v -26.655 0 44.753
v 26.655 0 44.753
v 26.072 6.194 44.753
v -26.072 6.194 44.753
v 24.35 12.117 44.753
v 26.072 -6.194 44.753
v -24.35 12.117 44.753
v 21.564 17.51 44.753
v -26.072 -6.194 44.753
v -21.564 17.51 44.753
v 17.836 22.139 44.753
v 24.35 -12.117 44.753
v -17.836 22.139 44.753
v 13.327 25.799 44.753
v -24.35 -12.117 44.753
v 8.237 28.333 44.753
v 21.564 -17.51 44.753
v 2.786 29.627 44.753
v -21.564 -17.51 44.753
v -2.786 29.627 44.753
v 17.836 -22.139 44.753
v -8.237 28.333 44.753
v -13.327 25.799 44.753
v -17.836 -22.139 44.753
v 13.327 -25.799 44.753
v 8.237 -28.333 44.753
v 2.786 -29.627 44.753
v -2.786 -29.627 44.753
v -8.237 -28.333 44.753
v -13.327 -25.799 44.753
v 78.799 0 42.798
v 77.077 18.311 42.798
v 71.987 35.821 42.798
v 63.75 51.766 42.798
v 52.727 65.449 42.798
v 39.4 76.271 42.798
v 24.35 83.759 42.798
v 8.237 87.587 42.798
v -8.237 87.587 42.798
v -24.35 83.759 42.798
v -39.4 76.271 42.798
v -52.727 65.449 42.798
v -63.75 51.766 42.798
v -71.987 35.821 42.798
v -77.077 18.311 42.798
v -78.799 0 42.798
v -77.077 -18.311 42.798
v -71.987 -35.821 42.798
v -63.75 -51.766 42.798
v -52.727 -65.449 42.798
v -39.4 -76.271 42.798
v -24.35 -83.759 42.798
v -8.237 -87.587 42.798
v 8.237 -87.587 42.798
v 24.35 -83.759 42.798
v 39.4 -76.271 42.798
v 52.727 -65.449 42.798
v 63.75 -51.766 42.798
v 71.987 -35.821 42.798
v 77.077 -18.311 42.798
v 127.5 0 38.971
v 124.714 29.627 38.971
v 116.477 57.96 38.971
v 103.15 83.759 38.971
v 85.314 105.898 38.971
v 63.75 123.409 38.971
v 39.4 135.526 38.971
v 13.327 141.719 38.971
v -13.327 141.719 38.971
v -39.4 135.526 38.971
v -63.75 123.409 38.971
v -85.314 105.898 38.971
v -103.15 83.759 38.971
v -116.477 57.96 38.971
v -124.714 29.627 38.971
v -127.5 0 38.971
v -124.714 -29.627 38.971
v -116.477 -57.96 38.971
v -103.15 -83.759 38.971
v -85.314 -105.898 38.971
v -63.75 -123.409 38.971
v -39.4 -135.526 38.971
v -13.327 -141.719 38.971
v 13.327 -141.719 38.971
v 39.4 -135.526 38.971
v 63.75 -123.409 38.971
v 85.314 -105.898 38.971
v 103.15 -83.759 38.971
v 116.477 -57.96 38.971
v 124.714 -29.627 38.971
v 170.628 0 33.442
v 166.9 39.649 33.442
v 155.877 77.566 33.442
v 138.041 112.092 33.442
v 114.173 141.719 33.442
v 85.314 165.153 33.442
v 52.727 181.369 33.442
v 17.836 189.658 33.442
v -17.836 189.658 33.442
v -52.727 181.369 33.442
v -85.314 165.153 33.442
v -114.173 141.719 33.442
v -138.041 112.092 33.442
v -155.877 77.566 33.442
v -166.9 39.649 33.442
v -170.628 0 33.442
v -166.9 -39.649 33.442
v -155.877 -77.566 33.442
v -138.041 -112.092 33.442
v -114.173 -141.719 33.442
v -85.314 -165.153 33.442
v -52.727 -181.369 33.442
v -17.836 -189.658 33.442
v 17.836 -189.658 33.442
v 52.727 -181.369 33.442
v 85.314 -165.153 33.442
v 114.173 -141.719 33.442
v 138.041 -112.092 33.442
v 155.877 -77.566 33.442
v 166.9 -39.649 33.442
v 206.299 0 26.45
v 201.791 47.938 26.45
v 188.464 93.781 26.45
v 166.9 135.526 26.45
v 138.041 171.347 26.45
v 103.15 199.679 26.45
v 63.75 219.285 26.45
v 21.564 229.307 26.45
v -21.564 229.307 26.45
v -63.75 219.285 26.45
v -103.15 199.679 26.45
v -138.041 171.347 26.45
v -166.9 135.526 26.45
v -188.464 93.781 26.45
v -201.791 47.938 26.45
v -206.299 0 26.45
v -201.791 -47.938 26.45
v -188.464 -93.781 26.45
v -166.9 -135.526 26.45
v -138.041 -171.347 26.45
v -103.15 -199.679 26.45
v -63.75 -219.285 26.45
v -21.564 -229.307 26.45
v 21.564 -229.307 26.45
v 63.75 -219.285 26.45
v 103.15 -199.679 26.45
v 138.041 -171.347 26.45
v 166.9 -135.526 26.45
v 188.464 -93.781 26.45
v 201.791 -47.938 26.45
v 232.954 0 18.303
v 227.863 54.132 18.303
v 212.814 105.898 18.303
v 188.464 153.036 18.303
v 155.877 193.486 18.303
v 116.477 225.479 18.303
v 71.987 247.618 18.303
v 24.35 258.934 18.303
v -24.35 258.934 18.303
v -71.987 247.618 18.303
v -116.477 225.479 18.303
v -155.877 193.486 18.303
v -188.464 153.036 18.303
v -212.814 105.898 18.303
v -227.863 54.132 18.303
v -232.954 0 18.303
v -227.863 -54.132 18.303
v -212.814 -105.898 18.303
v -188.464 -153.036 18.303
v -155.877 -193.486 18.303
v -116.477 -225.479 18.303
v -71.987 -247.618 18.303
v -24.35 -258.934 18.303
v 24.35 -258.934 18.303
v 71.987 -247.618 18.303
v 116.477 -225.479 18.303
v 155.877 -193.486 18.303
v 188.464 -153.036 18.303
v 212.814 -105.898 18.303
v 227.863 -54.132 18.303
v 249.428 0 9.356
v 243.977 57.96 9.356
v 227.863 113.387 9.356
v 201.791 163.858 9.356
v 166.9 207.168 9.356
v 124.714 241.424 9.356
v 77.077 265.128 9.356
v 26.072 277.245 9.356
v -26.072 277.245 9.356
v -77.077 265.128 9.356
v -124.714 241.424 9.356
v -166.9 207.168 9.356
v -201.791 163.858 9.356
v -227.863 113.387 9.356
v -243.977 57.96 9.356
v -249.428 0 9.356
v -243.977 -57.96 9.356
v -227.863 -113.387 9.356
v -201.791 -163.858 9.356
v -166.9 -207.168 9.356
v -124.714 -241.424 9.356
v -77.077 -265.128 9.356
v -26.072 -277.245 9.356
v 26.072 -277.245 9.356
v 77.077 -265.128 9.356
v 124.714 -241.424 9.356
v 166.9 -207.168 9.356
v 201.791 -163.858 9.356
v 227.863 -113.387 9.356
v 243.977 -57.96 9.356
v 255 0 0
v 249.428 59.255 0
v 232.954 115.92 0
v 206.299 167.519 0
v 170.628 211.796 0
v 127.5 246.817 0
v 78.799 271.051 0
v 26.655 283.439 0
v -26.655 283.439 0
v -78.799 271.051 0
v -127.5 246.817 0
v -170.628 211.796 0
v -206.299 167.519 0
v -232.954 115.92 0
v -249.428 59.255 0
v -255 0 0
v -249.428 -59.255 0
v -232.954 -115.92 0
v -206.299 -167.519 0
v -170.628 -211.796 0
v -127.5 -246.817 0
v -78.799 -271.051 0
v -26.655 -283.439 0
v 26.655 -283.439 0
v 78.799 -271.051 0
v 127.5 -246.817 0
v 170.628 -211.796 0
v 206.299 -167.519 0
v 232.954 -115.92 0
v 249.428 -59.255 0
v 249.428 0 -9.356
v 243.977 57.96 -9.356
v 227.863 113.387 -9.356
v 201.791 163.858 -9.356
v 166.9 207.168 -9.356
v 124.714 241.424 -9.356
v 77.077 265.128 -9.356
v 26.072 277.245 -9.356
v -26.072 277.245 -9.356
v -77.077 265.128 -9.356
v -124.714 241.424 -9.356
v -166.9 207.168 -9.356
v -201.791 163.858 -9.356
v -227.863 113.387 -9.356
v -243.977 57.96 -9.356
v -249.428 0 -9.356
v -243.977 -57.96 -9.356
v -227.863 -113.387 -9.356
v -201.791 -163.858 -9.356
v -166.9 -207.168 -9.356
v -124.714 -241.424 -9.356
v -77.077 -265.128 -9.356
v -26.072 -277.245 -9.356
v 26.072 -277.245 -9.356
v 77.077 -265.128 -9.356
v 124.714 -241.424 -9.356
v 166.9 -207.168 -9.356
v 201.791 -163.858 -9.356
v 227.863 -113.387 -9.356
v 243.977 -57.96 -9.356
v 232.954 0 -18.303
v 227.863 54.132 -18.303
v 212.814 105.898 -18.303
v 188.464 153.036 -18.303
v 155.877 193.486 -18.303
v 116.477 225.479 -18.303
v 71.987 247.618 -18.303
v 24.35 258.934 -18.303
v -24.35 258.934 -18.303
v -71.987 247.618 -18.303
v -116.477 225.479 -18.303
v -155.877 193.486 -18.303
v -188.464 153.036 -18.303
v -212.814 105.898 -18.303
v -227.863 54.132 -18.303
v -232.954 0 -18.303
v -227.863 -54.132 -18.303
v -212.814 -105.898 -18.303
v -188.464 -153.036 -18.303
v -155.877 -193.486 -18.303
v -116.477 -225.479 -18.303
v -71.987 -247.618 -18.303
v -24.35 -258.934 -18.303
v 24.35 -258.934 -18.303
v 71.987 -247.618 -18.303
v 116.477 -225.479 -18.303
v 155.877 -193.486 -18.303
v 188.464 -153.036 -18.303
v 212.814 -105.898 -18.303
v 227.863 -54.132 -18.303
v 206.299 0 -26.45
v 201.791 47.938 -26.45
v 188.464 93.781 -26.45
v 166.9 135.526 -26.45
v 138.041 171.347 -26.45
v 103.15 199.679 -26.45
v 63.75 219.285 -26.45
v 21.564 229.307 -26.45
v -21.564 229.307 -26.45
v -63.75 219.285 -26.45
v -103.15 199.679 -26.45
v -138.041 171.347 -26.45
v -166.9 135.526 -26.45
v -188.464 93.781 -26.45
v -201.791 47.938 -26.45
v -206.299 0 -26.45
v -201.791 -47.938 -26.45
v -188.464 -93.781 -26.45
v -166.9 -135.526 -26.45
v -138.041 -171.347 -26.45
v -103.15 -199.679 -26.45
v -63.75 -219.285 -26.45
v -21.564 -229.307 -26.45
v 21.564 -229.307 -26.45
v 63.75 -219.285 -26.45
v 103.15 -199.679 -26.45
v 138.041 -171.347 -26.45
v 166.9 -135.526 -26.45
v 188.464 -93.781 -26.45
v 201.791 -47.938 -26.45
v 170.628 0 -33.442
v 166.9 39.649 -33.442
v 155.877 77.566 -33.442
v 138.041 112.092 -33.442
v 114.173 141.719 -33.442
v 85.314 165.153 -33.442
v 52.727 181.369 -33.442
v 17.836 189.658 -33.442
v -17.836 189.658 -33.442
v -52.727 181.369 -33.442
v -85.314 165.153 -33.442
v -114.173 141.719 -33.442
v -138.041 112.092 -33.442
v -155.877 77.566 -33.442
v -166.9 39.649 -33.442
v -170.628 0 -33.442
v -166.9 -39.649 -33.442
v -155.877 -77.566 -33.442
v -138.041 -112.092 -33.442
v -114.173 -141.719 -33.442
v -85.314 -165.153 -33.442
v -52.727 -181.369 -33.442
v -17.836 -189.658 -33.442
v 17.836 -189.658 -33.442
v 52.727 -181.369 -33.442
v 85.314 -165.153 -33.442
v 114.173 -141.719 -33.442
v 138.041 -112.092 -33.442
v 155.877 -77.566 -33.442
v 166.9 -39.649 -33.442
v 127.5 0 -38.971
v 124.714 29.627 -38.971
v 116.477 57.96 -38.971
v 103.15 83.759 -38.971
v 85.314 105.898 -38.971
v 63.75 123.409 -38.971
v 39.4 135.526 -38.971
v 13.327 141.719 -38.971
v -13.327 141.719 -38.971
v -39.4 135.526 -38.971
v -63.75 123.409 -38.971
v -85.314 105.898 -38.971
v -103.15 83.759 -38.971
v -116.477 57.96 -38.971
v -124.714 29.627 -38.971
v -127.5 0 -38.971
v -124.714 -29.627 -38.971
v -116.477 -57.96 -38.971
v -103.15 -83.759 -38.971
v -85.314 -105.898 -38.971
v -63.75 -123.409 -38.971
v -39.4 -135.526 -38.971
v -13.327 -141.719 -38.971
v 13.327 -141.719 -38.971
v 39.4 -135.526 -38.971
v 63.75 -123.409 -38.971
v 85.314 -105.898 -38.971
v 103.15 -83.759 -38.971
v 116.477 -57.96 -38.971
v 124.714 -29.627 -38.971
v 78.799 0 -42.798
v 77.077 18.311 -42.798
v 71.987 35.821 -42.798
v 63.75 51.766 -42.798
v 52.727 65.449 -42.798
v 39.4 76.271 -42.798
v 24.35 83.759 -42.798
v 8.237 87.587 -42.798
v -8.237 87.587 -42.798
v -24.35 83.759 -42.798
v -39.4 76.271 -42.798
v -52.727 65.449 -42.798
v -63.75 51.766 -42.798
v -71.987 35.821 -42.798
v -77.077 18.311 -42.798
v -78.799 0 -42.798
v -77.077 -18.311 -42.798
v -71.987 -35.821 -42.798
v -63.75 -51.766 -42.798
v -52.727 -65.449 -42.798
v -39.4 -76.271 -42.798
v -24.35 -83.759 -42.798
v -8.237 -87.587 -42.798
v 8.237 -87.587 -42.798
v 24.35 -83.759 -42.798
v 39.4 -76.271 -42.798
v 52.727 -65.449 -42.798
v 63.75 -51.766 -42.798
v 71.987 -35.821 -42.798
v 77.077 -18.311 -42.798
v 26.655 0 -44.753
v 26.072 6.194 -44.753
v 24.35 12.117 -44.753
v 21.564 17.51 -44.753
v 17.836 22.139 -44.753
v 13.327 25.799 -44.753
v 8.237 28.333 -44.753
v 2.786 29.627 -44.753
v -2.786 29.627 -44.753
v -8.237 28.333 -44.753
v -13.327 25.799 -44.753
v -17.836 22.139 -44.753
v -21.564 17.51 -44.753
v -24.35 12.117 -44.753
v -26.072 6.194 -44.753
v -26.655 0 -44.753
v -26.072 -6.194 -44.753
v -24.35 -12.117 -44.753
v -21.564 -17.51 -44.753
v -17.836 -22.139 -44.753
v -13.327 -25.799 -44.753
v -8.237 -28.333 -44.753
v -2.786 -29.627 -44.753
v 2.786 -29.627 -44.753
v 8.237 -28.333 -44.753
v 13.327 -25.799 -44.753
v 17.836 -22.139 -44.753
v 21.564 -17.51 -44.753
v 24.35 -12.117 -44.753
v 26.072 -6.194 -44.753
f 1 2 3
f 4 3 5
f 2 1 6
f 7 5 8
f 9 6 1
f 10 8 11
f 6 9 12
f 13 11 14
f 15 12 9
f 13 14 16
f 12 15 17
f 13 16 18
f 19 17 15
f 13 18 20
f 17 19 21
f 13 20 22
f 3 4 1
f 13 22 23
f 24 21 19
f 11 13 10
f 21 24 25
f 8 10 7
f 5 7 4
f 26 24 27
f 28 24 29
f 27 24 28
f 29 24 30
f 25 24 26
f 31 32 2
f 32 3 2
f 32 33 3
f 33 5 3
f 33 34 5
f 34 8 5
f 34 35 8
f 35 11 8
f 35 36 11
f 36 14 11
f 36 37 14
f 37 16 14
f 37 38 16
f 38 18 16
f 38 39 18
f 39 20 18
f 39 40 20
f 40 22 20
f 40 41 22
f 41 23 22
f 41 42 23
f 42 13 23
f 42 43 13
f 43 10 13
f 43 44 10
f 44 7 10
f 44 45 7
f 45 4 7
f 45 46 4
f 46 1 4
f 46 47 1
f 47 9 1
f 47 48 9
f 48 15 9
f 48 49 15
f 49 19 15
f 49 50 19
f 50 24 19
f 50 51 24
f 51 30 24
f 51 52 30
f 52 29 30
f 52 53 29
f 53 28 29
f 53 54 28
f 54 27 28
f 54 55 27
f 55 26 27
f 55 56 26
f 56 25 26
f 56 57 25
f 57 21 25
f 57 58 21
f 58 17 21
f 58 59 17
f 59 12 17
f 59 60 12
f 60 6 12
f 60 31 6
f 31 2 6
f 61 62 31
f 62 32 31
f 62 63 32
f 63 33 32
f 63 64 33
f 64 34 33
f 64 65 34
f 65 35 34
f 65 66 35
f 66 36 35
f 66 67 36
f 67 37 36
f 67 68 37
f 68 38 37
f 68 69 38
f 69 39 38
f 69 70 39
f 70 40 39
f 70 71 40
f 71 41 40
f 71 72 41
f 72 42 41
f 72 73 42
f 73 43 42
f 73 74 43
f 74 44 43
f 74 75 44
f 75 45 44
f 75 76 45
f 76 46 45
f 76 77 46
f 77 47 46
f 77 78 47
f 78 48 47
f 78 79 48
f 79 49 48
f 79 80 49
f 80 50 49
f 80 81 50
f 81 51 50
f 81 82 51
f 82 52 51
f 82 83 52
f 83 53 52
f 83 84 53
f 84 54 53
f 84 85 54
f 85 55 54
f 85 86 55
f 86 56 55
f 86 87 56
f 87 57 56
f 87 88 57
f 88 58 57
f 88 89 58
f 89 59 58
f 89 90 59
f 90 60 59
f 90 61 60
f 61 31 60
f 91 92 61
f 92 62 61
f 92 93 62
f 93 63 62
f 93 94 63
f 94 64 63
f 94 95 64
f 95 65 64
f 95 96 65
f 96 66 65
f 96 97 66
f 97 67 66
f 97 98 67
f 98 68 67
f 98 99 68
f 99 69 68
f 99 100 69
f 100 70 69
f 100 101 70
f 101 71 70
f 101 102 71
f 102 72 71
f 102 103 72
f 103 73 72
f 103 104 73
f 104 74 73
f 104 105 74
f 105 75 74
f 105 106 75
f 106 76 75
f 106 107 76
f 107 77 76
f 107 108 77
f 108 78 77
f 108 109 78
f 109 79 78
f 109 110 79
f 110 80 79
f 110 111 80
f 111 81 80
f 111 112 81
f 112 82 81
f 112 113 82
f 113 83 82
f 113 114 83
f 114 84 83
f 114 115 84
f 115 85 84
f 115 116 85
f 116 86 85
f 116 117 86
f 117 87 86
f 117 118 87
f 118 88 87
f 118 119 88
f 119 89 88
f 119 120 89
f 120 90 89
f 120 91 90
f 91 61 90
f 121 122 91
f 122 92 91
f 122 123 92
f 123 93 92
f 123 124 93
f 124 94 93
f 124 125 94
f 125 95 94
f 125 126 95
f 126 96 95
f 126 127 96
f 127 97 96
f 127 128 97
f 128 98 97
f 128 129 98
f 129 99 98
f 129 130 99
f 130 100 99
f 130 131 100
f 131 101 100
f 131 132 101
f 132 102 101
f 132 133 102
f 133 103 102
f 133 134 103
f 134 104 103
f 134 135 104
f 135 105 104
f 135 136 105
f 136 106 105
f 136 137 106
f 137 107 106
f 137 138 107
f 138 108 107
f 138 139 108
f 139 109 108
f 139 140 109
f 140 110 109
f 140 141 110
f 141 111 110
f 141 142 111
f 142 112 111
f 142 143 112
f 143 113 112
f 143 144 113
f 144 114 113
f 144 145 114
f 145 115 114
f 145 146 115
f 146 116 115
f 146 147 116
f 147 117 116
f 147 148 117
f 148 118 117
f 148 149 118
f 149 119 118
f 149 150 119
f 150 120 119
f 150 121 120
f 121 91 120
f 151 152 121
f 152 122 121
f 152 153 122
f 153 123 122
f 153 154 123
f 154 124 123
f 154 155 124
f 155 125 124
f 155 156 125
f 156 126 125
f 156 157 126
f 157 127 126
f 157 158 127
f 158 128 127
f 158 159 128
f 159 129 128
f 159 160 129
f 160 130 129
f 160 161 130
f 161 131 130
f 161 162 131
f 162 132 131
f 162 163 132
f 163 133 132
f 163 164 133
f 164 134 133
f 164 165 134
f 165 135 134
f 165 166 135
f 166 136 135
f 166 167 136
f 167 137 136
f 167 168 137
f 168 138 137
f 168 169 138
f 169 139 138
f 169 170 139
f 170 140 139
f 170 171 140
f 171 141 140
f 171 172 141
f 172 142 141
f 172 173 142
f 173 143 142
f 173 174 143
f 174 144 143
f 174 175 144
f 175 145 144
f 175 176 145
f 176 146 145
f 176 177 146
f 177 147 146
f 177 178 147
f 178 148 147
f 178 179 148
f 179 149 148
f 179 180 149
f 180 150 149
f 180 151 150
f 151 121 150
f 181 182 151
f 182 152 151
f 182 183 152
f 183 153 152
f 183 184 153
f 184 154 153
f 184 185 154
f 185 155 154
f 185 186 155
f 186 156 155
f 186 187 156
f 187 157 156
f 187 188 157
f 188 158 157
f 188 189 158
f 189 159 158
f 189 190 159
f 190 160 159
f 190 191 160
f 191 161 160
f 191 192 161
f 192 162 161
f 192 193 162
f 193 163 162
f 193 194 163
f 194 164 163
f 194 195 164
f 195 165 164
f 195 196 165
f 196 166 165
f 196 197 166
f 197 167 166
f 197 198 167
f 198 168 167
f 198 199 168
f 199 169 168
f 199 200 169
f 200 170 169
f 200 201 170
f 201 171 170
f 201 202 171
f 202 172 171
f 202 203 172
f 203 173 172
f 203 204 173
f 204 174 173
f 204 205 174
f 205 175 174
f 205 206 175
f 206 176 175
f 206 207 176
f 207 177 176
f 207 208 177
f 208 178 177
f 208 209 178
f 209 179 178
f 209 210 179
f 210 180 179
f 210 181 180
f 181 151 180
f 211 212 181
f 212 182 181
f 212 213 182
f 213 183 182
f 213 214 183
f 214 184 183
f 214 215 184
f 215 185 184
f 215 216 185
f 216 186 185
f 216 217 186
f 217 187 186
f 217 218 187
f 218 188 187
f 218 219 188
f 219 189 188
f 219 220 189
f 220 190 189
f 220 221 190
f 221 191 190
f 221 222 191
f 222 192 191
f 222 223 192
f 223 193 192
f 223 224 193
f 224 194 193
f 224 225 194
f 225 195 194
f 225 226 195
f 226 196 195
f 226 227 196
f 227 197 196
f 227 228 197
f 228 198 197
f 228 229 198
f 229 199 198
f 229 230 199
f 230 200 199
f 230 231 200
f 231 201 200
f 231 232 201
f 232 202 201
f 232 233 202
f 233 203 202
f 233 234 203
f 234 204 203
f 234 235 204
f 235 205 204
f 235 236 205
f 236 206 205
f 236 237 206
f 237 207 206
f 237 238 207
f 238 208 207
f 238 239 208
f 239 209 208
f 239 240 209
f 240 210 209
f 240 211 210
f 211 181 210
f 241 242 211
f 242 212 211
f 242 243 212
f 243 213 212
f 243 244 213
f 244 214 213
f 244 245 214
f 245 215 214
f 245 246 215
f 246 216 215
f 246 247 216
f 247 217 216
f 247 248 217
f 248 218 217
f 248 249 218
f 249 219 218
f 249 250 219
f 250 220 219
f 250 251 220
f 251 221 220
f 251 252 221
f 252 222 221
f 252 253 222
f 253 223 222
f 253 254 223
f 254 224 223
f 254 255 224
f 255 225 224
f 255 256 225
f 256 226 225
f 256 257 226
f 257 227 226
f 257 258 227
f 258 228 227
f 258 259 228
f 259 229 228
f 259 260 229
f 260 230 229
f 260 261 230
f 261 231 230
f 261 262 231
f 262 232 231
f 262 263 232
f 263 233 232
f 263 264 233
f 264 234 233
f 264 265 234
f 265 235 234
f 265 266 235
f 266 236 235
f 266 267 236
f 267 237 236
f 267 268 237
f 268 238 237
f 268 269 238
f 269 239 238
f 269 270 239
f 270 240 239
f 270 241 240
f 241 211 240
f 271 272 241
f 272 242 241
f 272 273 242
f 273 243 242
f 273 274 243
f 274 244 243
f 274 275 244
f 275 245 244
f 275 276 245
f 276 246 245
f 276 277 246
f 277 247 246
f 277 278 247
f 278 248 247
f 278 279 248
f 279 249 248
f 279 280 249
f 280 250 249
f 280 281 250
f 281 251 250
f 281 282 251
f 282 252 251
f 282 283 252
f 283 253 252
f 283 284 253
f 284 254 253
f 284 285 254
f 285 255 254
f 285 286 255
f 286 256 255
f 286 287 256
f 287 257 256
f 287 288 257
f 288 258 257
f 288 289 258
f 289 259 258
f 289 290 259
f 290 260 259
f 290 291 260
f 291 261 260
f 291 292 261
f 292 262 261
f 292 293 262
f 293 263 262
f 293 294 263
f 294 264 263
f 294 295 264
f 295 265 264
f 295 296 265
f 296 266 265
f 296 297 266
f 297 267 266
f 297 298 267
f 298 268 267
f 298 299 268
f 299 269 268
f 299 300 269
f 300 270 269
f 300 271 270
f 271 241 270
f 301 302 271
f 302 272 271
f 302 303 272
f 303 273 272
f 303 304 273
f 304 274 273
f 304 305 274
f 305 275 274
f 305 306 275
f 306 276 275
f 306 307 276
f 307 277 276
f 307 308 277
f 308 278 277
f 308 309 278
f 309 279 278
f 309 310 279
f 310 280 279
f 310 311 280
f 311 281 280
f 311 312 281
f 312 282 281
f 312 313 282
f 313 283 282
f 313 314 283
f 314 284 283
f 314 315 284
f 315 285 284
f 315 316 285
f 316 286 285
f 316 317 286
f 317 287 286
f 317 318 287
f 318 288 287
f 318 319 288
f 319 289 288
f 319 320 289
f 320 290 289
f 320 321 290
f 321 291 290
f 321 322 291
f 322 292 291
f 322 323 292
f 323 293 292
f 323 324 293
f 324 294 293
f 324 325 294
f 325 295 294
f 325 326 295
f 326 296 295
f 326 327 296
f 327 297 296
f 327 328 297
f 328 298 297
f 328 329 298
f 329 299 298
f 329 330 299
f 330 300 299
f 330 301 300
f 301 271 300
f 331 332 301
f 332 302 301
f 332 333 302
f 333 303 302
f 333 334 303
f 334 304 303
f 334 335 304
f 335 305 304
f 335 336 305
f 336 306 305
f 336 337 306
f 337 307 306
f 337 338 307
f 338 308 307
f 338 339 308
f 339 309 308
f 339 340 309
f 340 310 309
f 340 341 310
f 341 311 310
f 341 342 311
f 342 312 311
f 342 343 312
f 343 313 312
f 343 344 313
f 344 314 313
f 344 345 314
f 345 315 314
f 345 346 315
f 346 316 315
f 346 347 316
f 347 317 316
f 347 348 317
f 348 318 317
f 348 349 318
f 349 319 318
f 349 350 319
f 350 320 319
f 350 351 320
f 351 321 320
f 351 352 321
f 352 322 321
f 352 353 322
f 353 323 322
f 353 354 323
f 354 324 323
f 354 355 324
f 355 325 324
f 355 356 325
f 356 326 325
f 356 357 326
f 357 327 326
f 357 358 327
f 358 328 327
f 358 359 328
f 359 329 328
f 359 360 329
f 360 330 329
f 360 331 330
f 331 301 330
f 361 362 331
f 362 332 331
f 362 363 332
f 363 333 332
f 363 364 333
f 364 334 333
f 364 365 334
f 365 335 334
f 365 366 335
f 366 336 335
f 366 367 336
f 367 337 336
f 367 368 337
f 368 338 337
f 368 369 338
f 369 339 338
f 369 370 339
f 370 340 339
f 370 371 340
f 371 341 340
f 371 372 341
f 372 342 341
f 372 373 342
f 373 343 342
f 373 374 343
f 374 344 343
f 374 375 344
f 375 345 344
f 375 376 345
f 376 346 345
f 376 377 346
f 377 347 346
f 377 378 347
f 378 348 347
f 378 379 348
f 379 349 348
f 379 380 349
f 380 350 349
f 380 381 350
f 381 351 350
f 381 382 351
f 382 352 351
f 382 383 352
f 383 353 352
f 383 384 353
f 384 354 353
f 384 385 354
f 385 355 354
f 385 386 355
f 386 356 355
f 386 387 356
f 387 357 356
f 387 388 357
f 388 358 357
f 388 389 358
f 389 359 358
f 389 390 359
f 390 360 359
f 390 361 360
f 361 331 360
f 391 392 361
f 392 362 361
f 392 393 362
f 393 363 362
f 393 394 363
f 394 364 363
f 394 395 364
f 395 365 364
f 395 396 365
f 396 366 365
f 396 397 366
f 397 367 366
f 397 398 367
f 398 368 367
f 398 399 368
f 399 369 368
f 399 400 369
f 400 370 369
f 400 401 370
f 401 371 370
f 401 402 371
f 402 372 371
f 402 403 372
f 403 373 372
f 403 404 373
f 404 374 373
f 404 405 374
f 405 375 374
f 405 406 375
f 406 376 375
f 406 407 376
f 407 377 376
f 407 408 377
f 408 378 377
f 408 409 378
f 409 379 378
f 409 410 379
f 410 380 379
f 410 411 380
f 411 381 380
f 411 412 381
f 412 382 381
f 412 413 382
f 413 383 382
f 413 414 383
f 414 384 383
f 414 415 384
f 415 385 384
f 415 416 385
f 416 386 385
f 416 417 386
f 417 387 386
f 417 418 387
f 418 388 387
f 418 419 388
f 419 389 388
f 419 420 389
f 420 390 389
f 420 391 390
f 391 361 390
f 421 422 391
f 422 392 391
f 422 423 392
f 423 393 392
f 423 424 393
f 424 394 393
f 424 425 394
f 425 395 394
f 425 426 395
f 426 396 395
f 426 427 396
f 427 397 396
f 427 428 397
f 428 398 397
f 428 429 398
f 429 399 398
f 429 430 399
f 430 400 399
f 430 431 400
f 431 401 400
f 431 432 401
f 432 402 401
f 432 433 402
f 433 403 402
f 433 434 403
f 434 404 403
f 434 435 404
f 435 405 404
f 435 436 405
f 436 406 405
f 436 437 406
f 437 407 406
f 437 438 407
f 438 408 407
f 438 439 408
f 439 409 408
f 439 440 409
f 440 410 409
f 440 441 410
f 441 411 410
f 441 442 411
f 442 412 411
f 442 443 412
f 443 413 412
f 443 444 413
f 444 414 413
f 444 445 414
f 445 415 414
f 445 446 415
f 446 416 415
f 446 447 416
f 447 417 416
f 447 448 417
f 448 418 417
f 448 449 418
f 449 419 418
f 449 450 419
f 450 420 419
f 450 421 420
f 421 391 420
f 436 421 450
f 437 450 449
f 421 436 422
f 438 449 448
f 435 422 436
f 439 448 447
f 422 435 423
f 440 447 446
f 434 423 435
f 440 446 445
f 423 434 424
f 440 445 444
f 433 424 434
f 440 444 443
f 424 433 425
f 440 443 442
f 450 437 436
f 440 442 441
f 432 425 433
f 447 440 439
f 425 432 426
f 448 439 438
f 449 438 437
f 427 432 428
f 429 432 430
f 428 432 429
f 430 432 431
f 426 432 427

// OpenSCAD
// Generated by SolidPython 1.0.1 on 2020-07-29 00:46:53


scale(v = [17, 19, 3]) {
	sphere(r = 15);
}
/***********************************************
*********      SolidPython code:      **********
************************************************
 
# import packages: SolidPython
from solid import *
from solid.utils import *
from itertools import chain, combinations, permutations


class Resize:

    def __init__(self, scad_file):
        self.scad_file = scad_file
        #self.scad_file = import_scad(scad_file)
        # cone/cylinder param:
        self.r1 = 0
        self.r2 = 0
        self.h = 0
        # rectangular prism param:
        self.w = 0
        self.l = 0
        # ellipse param:
        self.r = 0

    # import OpenScad code (file name corresponds to shape)


    # classify shape + parameters
    def assign(self, param1, param2, param3):
        if self.scad_file == 'cone.scad':
            self.r1 = param1
            self.r2 = param2
            self.h = param3
        elif self.scad_file == 'cylinder.scad':
            self.r1 = param1
            self.r2 = param2
            self.h = param3
        elif self.scad_file == 'rectangularPrism.scad':
            self.h = param1
            self.l = param2
            self.w = param3
        else:
            self.r = param1
            self.h = param2

    # resize parameters
    def iterate(self):
        x = range(3, 20, 2)
        i = 1
        if self.scad_file == 'cone.scad':
            tempList = list(permutations(x, 2))
            for temp in tempList:
                param1 = temp[0]
                param2 = temp[1]
                filepath = 'produced_scad_files/' + 'cone' + str(param1) + '_' + str(param2) + '_' + '.scad'
                scad_render_to_file(cylinder(h=param1, r1=param2, r2=0), filepath)

        elif self.scad_file == 'cylinder.scad':
            tempList = list(permutations(x, 3))
            for temp in tempList:
                param1 = temp[0]
                param2 = temp[1]
                filepath = 'produced_scad_files/' + 'cylinder' + str(param1) + '_' + str(param2) + '_' + '.scad'
                scad_render_to_file(cylinder(h=param1, r1=param2, r2=param2), filepath)

        elif self.scad_file == 'rectangularPrism.scad':
            tempList = list(permutations(x, 3))
            for temp in tempList:
                param1 = temp[0]
                param2 = temp[1]
                param3 = temp[2]
                filepath = 'produced_scad_files/' + 'rectangularPrism' + str(param1) + '_' + str(param2) + '_' + str(
                    param3) + '.scad'
                scad_render_to_file(cube(size=(param1, param2, param3)), filepath)

        elif self.scad_file == 'ellipse.scad':
            tempList = list(permutations(x, 4))
            for temp in tempList:
                param1 = temp[0]
                param2 = temp[1]
                param3 = temp[2]
                param4 = temp[3]
                filepath = 'produced_scad_files/' + 'ellipse' + str(param1) + '_' + str(param2) + '_' + str(param3) + '_' + str(param4) + '.scad'
                scad_render_to_file(scale([param1, param2, param3])(sphere(r=param4)), filepath)

    def render_to_scadfile(self):
        scad_render_to_file(scad, 'example.scad') 
 
************************************************/
